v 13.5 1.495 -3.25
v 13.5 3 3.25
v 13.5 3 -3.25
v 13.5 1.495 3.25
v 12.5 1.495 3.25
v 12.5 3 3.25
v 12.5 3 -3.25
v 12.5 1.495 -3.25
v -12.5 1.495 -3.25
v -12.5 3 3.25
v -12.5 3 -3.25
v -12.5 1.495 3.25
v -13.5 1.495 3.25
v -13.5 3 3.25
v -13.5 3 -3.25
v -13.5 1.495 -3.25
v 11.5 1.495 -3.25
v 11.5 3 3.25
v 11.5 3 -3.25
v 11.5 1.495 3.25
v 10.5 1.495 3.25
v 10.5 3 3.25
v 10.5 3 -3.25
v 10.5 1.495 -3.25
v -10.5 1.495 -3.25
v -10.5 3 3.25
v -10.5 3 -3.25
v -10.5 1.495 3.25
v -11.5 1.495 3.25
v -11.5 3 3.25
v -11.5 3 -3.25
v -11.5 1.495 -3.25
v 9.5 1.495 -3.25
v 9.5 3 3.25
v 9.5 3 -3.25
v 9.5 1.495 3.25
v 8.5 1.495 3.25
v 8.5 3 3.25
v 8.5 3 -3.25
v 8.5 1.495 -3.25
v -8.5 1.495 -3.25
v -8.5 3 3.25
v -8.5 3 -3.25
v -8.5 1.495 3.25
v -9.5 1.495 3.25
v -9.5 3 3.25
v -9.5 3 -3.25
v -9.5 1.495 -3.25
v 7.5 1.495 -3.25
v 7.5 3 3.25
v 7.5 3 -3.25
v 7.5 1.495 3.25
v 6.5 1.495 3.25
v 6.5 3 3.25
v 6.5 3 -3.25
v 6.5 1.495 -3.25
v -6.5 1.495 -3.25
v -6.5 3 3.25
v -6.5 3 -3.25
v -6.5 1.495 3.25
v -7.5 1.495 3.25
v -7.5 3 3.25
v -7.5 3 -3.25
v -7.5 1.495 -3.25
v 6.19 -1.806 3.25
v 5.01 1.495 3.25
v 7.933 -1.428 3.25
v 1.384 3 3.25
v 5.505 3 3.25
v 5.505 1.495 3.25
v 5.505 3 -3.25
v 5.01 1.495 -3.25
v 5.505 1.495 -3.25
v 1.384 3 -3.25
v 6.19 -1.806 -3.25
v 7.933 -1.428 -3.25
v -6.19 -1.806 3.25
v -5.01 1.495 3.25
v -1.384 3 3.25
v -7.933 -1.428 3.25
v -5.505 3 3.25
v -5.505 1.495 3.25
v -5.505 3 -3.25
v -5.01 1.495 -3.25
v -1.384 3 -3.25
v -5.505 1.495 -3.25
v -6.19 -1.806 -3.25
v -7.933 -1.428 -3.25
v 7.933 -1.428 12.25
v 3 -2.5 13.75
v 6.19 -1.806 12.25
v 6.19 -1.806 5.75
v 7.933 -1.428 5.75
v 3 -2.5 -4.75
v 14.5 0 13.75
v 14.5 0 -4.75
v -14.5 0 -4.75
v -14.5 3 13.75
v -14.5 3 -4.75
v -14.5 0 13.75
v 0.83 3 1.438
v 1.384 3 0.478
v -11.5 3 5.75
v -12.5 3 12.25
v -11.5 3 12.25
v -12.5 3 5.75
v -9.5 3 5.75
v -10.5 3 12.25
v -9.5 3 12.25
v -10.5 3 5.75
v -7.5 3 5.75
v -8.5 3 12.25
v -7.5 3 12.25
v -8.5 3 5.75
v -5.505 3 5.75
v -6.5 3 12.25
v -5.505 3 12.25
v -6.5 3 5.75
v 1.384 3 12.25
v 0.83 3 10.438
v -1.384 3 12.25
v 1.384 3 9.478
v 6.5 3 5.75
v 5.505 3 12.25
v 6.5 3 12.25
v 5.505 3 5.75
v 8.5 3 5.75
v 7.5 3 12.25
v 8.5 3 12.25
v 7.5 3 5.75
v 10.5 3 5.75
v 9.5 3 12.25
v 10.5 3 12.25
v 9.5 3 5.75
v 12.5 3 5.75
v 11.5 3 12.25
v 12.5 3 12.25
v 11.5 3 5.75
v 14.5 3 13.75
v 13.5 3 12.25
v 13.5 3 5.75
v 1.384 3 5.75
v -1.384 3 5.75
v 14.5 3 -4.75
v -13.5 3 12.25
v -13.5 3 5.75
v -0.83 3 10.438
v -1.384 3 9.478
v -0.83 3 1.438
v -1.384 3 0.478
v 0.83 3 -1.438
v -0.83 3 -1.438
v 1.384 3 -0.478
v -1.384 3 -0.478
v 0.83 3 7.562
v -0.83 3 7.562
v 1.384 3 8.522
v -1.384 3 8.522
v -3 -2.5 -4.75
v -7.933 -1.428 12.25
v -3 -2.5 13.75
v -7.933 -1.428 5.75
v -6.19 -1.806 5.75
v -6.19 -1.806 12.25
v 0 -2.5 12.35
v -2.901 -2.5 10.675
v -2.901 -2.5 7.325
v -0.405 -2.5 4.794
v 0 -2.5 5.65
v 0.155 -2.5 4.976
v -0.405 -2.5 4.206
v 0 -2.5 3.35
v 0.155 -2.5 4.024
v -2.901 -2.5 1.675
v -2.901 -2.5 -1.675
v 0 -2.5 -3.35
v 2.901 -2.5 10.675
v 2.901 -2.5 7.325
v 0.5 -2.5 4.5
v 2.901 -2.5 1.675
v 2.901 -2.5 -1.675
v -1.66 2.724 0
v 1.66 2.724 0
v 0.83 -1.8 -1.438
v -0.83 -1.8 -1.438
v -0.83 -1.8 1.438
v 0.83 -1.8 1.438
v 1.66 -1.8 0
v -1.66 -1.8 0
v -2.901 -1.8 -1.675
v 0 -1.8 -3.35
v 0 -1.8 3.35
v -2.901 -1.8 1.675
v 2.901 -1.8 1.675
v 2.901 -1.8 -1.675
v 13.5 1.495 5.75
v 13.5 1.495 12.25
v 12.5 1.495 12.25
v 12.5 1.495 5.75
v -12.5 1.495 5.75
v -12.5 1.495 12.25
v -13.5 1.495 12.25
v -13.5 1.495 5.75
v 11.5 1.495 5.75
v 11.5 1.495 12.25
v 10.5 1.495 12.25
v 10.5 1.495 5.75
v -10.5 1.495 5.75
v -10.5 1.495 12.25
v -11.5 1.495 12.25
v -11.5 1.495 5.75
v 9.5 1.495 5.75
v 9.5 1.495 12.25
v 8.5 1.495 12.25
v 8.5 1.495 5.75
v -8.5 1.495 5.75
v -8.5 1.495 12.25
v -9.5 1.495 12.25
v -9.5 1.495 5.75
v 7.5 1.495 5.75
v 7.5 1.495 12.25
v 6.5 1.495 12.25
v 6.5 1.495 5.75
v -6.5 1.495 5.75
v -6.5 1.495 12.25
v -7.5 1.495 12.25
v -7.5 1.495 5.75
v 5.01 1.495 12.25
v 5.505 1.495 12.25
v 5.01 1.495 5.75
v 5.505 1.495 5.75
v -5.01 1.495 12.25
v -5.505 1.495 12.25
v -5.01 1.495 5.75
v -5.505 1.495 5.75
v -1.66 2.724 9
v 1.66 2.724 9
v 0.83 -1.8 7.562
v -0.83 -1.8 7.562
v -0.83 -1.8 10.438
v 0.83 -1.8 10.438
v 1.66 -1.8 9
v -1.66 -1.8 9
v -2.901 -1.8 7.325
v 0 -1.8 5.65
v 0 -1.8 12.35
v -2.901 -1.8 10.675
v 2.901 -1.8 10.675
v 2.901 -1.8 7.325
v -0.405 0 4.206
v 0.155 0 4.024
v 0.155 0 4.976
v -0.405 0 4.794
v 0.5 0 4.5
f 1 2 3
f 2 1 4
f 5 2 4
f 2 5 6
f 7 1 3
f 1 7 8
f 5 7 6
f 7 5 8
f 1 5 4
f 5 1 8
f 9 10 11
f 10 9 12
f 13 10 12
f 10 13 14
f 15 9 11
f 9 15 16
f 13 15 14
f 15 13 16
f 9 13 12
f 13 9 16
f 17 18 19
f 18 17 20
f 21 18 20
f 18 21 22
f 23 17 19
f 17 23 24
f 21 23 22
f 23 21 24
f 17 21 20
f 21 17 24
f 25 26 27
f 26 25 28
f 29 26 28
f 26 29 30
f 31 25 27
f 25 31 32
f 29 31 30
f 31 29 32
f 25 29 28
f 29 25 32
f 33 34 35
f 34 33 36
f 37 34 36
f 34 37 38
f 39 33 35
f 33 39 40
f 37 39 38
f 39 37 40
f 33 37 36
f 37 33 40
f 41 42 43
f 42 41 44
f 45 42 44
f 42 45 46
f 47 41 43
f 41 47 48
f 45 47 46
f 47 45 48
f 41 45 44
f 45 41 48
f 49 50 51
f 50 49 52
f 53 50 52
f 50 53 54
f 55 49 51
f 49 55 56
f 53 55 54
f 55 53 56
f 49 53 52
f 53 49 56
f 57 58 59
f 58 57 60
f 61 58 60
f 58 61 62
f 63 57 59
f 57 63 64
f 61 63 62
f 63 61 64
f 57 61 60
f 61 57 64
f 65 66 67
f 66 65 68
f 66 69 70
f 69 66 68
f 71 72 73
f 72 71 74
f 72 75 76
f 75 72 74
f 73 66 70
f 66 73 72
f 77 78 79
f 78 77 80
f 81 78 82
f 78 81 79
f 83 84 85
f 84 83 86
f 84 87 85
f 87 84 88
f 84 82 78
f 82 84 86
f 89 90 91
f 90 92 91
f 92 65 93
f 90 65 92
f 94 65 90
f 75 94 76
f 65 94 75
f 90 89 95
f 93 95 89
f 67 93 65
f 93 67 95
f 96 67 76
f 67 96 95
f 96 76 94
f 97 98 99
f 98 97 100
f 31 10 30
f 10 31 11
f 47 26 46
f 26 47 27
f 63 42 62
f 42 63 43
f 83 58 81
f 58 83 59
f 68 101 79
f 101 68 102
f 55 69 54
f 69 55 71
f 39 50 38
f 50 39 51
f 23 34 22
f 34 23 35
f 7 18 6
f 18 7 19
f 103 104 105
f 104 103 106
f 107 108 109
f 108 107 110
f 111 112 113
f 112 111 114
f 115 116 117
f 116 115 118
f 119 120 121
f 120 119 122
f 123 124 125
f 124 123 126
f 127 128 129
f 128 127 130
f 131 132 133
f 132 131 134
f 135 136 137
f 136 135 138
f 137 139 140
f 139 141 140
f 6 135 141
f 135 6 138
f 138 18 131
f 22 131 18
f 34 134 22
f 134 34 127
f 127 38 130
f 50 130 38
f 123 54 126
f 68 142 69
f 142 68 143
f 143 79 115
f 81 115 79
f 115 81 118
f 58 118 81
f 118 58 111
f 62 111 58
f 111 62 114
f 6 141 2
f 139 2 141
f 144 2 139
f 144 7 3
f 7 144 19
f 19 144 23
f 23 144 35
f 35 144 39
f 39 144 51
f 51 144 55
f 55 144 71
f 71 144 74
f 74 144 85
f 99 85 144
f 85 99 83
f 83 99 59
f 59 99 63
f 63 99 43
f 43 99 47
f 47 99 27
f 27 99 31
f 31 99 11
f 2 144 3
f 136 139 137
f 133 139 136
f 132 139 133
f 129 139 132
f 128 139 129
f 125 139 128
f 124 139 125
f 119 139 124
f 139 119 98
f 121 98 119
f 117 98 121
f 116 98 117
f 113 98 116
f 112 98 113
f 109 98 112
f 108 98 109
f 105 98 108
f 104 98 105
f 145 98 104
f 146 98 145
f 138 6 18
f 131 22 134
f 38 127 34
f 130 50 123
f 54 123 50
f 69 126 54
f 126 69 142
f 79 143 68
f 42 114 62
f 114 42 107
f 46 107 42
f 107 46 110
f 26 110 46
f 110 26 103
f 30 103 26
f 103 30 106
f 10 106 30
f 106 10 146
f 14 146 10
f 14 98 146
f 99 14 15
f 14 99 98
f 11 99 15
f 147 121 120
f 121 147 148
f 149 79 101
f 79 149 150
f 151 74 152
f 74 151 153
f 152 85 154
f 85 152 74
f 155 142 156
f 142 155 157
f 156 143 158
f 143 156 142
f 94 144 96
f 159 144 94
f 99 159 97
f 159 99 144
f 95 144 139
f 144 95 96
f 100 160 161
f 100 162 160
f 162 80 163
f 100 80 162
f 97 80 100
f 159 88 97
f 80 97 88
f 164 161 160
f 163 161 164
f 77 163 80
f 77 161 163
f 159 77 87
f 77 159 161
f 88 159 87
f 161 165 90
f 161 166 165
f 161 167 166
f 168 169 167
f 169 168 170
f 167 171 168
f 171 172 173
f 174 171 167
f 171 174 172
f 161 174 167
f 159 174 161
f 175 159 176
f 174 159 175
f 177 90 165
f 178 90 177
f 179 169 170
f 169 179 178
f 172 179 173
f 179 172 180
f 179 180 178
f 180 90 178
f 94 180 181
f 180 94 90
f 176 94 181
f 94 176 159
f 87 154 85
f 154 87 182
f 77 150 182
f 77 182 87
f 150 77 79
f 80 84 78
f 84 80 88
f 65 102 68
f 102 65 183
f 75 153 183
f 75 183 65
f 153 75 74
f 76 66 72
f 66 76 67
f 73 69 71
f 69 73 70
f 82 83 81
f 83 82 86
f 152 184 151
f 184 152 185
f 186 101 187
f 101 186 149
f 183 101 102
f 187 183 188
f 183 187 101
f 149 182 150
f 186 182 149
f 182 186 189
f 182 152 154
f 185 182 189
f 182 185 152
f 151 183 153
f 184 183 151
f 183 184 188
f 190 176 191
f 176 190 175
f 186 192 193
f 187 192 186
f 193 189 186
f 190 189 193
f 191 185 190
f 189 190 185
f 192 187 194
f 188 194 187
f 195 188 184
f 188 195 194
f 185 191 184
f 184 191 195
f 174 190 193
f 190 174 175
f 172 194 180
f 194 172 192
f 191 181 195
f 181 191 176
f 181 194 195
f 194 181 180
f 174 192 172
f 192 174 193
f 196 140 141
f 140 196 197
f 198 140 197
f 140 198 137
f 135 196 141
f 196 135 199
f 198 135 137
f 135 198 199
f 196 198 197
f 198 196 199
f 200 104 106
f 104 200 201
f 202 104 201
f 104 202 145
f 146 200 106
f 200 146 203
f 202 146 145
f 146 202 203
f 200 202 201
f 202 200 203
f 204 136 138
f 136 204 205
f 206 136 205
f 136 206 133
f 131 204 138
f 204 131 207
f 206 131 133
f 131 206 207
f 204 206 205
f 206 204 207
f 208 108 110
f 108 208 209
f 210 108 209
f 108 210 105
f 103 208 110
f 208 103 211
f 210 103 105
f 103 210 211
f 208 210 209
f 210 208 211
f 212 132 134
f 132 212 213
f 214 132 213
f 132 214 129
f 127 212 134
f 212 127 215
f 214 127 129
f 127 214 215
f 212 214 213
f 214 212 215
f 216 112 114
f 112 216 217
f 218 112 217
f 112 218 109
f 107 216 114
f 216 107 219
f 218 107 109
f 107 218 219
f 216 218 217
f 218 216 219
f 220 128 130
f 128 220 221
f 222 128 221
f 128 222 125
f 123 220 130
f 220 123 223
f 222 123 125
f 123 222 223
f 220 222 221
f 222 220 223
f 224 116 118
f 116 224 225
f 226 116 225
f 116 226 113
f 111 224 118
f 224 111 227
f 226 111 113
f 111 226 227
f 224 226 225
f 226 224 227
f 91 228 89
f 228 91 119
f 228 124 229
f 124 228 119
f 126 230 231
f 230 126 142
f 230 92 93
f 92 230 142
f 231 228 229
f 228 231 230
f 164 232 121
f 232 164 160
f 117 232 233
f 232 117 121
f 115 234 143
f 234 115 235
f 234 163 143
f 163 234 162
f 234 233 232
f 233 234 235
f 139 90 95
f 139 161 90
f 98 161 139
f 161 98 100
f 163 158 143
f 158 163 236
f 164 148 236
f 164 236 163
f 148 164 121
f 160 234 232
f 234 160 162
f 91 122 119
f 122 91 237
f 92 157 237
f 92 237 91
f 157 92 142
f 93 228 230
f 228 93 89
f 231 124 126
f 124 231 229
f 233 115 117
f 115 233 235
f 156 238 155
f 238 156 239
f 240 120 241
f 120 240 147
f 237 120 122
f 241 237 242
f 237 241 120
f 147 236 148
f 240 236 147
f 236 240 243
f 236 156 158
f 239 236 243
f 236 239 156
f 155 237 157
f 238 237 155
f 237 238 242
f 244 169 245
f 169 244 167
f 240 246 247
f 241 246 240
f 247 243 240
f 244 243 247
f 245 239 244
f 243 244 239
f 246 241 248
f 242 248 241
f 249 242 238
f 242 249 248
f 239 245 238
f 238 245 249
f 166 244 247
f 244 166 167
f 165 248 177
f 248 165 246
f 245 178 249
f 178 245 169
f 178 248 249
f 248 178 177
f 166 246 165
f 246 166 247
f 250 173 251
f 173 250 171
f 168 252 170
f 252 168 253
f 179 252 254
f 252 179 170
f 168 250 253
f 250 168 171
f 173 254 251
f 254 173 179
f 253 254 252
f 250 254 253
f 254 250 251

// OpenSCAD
// Tough Belt Clip
// Design by Marius Gheorghescu, December 2013


// how many teeth on each side
teeth = 5;

// width of the belt in mm incl clearance (use 6.25 for typical GT2 belt)
belt_width = 6.5;

// thickness of the belt in mm (use 1.5 for GT2 belt)
belt_thickness = 1.5;

// belt pitch in mm (use 2.0 for GT2 belt)
pitch = 2.0;

// this controls the strength of the bracket 
shell = 1.5;

/* [Hidden] */
cutout_width = 6 + belt_thickness + shell;
len = 2*teeth*pitch + cutout_width;
round_corner_epsilon = 1;
epsilon = 0.01;


module belt()
{
	// reinforcement
	//cube([len, 2, h], center=true);

	for(i=[pitch/4:pitch:len]) {
		translate([i-len/2, 1.25, 0])
			cube([pitch - round_corner_epsilon, belt_thickness + round_corner_epsilon, belt_width], center=true);

	}

}



module clip() {
difference()  {

	union() {
		// general shape of the clip
		linear_extrude(belt_width + 2*shell, center=true) {
			polygon(points=[
				[len/2,0],
				[3,-2.5], 
				[-3,-2.5], 
				[-len/2,0], 
				[-len/2, shell + belt_thickness], 
				[len/2, shell + belt_thickness]
			]);
		}


		
	}

	// left belt turn
	rotate([0,0,-45])
	translate([-3.2/2 - shell - belt_thickness/2,0,0])
		cube([belt_thickness, 20 + 2*shell, belt_width], center=true);

	// right belt turn
	rotate([0,0,45])
//+ belt_thicknes/2 + shell
	translate([3.2/2 + shell + belt_thickness/2,0,0])
		cube([belt_thickness, 20 + 2*shell, belt_width], center=true);

	// cutouts
	translate([len/2 - teeth*pitch, shell + belt_thickness/2, 0])
		cube([pitch + epsilon, belt_thickness + epsilon, belt_width], center=true);

	translate([-len/2 + teeth*pitch, shell + belt_thickness/2, 0])
		cube([pitch + epsilon, belt_thickness + epsilon, belt_width], center=true);


	// m3 hole
	rotate([90,0,0])
		cylinder(r=1.66, h=10 + 2*shell, center=true);

	// hex nut
	translate([0, -3.8, 0])
	rotate([90,90,0])
		cylinder(r=3.35, h=4, center=true, $fn=6);

	// belt teeth
	for(i=[1:1:teeth]) {

		// left side
		color([1,0, 0])
		translate([len/2 + pitch/4 - i*pitch, shell + belt_thickness/2, 0])
			cube([pitch/2, belt_thickness + epsilon, belt_width], center=true);

		// right side 
		color([1,0, 0])
		translate([-len/2 - pitch/4 + i*pitch, shell + belt_thickness/2, 0])
			cube([pitch/2, belt_thickness + epsilon, belt_width], center=true);
	}

}


}


module clip_set()
{
	for(i=[0:10:50]) {
		translate([0,i,0])
			clip();
	}
}

//clip_set();
difference() {
    union() {
        translate([0,0,0]) clip();
        translate([0,0,9]) clip();
    };
    translate([0,0,4.5]) {
        rotate([90,0,0]) {
            cylinder(r=.5, h=20);
        }
    };
}
/*
translate([0,20,5]) {
  difference() {
      cube([7,3,20], center=true);
      rotate([90,0,0]) {
          cylinder(r=1.66, h=10 + 2*shell, center=true);
          
      }
      rotate([90,0,0]) {
          translate([0,5,0]) {
              cylinder(r=1.66, h=10 + 2*shell, center=true);
          }
      }
      rotate([90,0,0]) {
          translate([0,-5,0]) {
              cylinder(r=1.66, h=10 + 2*shell, center=true);
          }
      }
  }
}
*/
